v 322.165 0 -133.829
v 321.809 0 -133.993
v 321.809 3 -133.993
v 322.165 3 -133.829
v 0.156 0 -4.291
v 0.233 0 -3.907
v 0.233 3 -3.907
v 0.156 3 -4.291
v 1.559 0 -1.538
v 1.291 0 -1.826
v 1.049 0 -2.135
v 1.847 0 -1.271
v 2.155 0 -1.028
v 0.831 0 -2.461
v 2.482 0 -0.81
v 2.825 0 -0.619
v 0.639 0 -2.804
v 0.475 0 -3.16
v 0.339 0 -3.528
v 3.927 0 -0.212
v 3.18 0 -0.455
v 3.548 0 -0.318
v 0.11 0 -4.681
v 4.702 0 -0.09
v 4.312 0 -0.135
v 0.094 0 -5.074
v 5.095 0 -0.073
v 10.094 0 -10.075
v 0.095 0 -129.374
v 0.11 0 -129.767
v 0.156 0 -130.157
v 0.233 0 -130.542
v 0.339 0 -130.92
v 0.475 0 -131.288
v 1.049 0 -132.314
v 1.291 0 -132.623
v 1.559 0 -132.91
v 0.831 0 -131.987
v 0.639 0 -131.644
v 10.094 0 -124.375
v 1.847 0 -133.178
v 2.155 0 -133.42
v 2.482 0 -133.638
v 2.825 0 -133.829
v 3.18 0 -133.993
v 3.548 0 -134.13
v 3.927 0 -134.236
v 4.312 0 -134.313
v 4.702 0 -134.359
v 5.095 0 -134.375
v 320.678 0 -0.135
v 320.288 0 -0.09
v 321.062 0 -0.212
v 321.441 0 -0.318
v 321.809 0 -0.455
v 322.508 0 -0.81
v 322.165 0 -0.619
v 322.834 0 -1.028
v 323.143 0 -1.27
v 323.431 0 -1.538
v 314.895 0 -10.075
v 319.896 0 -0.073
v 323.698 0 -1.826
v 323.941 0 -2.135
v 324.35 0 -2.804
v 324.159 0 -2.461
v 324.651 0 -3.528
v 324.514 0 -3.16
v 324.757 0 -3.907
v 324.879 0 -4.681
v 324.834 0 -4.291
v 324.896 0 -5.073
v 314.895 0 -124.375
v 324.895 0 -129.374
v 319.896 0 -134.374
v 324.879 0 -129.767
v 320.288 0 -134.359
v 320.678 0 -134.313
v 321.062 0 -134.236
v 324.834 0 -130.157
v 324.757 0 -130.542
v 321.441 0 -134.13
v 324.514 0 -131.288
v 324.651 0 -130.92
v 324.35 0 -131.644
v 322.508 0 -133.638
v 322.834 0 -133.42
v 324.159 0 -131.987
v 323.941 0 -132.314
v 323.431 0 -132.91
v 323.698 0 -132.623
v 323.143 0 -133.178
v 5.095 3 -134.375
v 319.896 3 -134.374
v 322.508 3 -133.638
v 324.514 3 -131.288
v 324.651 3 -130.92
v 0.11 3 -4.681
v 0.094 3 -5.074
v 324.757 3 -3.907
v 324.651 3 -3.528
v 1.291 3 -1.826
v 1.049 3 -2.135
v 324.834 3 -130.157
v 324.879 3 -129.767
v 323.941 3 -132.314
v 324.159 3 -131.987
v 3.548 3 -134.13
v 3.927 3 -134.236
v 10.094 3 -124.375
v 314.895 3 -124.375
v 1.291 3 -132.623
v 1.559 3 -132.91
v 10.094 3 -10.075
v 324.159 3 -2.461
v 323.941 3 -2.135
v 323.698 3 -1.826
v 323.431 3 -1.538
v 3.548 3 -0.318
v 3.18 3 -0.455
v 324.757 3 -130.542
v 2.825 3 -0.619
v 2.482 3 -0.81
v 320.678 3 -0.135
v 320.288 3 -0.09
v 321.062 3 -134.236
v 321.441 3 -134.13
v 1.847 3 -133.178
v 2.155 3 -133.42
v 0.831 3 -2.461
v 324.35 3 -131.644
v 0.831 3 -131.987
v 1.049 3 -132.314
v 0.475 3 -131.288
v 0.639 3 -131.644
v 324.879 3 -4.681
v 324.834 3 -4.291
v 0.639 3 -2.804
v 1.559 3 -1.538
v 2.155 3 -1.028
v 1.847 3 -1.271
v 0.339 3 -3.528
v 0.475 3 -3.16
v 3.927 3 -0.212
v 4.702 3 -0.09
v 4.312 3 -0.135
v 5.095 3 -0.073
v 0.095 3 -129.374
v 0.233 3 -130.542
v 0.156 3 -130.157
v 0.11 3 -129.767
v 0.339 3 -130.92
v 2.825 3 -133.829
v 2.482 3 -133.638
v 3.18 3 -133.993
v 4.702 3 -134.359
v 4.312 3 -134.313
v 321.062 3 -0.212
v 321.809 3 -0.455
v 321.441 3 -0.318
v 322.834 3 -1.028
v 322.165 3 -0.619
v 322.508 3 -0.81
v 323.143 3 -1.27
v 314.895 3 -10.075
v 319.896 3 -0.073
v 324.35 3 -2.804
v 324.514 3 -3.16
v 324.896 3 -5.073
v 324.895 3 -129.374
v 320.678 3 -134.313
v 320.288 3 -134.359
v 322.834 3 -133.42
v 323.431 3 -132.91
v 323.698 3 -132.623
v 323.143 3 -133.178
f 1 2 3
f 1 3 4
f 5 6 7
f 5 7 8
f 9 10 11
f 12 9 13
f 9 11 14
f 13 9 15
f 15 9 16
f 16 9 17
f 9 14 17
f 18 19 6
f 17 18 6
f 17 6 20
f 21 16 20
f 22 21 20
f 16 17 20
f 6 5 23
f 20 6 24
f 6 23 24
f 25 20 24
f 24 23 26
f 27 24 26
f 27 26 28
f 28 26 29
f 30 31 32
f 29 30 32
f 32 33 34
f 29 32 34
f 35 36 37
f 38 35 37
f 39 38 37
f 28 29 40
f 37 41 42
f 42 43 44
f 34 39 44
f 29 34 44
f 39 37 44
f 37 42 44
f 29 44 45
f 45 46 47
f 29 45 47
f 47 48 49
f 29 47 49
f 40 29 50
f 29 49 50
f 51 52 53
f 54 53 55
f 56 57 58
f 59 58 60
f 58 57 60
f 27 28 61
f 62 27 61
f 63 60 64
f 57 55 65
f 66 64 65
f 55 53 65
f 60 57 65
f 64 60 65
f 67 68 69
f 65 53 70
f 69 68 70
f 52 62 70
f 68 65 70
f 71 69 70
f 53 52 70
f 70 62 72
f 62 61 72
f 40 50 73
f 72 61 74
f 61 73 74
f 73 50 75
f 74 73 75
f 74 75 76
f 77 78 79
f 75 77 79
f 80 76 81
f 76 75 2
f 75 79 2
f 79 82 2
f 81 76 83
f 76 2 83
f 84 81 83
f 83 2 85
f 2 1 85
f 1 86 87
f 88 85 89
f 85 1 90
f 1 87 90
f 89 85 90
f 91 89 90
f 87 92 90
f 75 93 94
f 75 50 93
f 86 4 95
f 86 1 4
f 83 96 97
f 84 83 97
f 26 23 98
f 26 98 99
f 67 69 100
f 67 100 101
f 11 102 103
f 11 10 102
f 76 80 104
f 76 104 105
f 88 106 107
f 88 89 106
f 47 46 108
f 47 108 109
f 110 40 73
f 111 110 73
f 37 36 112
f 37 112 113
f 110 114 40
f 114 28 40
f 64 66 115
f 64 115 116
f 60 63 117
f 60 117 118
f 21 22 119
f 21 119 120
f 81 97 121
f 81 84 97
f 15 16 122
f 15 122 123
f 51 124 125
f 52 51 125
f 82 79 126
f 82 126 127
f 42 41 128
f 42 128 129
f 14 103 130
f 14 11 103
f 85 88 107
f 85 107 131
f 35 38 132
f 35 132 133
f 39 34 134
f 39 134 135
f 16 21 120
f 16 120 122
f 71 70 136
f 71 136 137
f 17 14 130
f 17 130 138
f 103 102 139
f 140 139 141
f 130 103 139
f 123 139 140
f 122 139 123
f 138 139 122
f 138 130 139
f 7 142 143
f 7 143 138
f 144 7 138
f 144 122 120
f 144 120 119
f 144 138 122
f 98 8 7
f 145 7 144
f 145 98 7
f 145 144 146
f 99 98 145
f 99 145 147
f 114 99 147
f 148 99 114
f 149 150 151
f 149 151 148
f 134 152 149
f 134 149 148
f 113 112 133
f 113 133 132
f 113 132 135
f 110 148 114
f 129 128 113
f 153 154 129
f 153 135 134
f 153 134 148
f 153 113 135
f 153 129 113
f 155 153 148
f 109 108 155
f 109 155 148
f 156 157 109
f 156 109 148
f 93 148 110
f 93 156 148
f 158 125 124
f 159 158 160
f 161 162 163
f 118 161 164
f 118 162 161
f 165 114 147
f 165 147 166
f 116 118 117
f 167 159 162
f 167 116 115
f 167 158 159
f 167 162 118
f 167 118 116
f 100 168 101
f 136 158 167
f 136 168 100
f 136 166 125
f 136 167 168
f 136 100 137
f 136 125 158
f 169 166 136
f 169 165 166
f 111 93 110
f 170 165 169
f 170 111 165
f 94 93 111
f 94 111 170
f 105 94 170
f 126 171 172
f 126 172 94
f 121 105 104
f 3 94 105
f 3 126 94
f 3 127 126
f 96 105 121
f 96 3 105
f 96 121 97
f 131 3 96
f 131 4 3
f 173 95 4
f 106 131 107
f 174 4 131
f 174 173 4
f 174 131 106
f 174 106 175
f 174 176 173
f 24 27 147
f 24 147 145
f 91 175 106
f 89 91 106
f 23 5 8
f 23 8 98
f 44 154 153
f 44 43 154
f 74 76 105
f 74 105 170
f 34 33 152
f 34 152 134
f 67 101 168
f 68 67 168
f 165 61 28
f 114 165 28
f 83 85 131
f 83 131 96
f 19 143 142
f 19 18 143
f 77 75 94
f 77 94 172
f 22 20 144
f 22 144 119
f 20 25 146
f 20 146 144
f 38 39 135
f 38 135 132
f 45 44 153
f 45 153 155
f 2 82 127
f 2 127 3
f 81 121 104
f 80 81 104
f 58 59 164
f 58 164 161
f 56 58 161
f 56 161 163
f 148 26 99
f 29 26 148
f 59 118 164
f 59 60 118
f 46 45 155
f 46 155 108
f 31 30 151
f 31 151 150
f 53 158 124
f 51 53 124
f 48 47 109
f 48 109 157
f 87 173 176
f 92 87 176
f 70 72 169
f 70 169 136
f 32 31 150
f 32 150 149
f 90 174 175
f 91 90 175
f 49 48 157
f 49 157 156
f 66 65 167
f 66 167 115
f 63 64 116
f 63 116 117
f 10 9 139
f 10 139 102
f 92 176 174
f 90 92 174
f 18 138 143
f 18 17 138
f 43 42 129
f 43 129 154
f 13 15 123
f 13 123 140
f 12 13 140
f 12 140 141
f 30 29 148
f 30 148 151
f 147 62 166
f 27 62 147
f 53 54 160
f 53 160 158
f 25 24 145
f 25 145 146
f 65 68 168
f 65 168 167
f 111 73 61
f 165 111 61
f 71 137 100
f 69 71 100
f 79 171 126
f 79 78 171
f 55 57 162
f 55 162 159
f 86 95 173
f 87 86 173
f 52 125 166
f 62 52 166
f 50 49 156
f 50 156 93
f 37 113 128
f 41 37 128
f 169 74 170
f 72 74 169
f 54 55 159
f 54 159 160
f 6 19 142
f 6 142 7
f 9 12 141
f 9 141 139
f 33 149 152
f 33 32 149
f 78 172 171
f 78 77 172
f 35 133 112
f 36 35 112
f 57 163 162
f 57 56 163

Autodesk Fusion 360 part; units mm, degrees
sketch "Sketch1" plane through (0, 0, 0) normal (0, 1, 0) x (1, 0, 0)
  line L0 (0.6394, 2.8043) -> (0.4754, 3.1598)
  line L1 (322.165, 133.829) -> (322.508, 133.638)
  line L2 (0.4754, 3.1598) -> (0.339, 3.5278)
  line L3 (324.895, 129.374) -> (324.896, 5.0726)
  line L4 (0.2329, 3.9067) -> (0.1557, 4.2912)
  line L5 (0.339, 3.5278) -> (0.2329, 3.9067)
  line L6 (0.831, 2.4612) -> (0.6394, 2.8043)
  line L7 (0.1557, 4.2912) -> (0.1102, 4.6812)
  line L8 (321.809, 0.4548) -> (321.441, 0.3183)
  line L9 (320.678, 0.135) -> (320.288, 0.0896)
  line L10 (1.2912, 1.8259) -> (1.0487, 2.1346)
  line L11 (324.879, 129.767) -> (324.895, 129.374)
  line L12 (324.514, 131.288) -> (324.651, 130.92)
  line L13 (323.698, 132.623) -> (323.941, 132.314)
  line L14 (324.159, 2.4612) -> (323.941, 2.1346)
  line L15 (324.651, 3.5278) -> (324.514, 3.1598)
  line L16 (323.431, 1.5379) -> (323.143, 1.2705)
  line L17 (324.35, 2.8043) -> (324.159, 2.4612)
  line L18 (324.757, 130.542) -> (324.834, 130.157)
  line L19 (324.834, 4.2912) -> (324.757, 3.9067)
  line L20 (322.508, 0.8103) -> (322.165, 0.6187)
  line L21 (324.757, 3.9067) -> (324.651, 3.5278)
  line L22 (323.698, 1.8259) -> (323.431, 1.5379)
  line L23 (322.834, 1.028) -> (322.508, 0.8103)
  line L24 (322.508, 133.638) -> (322.834, 133.42)
  line L25 (320.288, 0.0896) -> (319.896, 0.073)
  line L26 (322.834, 133.42) -> (323.143, 133.178)
  line L27 (321.062, 134.236) -> (321.441, 134.13)
  line L28 (323.143, 133.178) -> (323.431, 132.91)
  line L29 (324.651, 130.92) -> (324.757, 130.542)
  line L30 (3.9274, 0.2122) -> (3.5485, 0.3183)
  line L31 (324.35, 131.644) -> (324.514, 131.288)
  line L32 (320.288, 134.359) -> (320.678, 134.313)
  line L33 (320.678, 134.313) -> (321.062, 134.236)
  line L34 (321.441, 134.13) -> (321.809, 133.993)
  line L35 (323.941, 132.314) -> (324.159, 131.987)
  line L36 (321.062, 0.2122) -> (320.678, 0.135)
  line L37 (323.143, 1.2706) -> (322.834, 1.028)
  line L38 (321.441, 0.3183) -> (321.062, 0.2122)
  line L39 (319.896, 0.073) -> (5.0946, 0.073)
  line L40 (324.514, 3.1598) -> (324.35, 2.8043)
  line L41 (324.896, 5.0726) -> (324.879, 4.6812)
  line L42 (324.834, 130.157) -> (324.879, 129.767)
  line L43 (5.0946, 0.073) -> (4.7019, 0.0896)
  line L44 (324.879, 4.6812) -> (324.834, 4.2912)
  line L45 (321.809, 133.993) -> (322.165, 133.829)
  line L46 (3.1805, 0.4548) -> (2.825, 0.6187)
  line L47 (319.896, 134.374) -> (320.288, 134.359)
  line L48 (4.3119, 0.135) -> (3.9274, 0.2122)
  line L49 (2.1553, 1.028) -> (1.8466, 1.2706)
  line L50 (2.825, 0.6187) -> (2.4819, 0.8103)
  line L51 (2.4819, 0.8103) -> (2.1553, 1.028)
  line L52 (324.159, 131.987) -> (324.35, 131.644)
  line L53 (322.165, 0.6187) -> (321.809, 0.4548)
  line L54 (4.7019, 0.0896) -> (4.3119, 0.135)
  line L55 (3.5485, 0.3183) -> (3.1805, 0.4548)
  line L56 (323.941, 2.1346) -> (323.698, 1.8259)
  line L57 (323.431, 132.91) -> (323.698, 132.623)
  line L58 (3.1805, 133.993) -> (3.5485, 134.13)
  line L59 (1.8466, 133.178) -> (2.1553, 133.42)
  line L60 (4.3119, 134.313) -> (4.7019, 134.359)
  line L61 (4.7019, 134.359) -> (5.0946, 134.375)
  line L62 (5.0946, 134.375) -> (319.896, 134.374)
  line L63 (3.5485, 134.13) -> (3.9274, 134.236)
  line L64 (1.5586, 1.5379) -> (1.2912, 1.8259)
  line L65 (0.6394, 131.644) -> (0.831, 131.987)
  line L66 (0.4754, 131.288) -> (0.6394, 131.644)
  line L67 (0.1102, 129.767) -> (0.1557, 130.157)
  line L68 (2.1553, 133.42) -> (2.4819, 133.638)
  line L69 (1.8466, 1.2706) -> (1.5586, 1.5379)
  line L70 (0.1102, 4.6812) -> (0.0937, 5.0739)
  line L71 (314.895, 124.375) -> (314.895, 10.0748)
  line L72 (10.0941, 124.375) -> (314.895, 124.375)
  line L73 (3.9274, 134.236) -> (4.3119, 134.313)
  line L74 (0.831, 131.987) -> (1.0487, 132.314)
  line L75 (1.0487, 132.314) -> (1.2912, 132.623)
  line L76 (314.895, 10.0748) -> (10.0941, 10.0748)
  line L77 (0.2329, 130.542) -> (0.339, 130.92)
  line L78 (0.339, 130.92) -> (0.4754, 131.288)
  line L79 (0.0937, 5.0739) -> (0.0951, 129.374)
  line L80 (1.2912, 132.623) -> (1.5586, 132.91)
  line L81 (0.1557, 130.157) -> (0.2329, 130.542)
  line L82 (2.825, 133.829) -> (3.1805, 133.993)
  line L83 (0.0951, 129.374) -> (0.1102, 129.767)
  line L84 (10.0941, 10.0748) -> (10.0941, 124.375)
  line L85 (1.5586, 132.91) -> (1.8466, 133.178)
  line L86 (2.4819, 133.638) -> (2.825, 133.829)
  line L87 (1.0487, 2.1346) -> (0.831, 2.4612)
extrude "Extrude1" add sketch "Sketch1" along normal blind 3
